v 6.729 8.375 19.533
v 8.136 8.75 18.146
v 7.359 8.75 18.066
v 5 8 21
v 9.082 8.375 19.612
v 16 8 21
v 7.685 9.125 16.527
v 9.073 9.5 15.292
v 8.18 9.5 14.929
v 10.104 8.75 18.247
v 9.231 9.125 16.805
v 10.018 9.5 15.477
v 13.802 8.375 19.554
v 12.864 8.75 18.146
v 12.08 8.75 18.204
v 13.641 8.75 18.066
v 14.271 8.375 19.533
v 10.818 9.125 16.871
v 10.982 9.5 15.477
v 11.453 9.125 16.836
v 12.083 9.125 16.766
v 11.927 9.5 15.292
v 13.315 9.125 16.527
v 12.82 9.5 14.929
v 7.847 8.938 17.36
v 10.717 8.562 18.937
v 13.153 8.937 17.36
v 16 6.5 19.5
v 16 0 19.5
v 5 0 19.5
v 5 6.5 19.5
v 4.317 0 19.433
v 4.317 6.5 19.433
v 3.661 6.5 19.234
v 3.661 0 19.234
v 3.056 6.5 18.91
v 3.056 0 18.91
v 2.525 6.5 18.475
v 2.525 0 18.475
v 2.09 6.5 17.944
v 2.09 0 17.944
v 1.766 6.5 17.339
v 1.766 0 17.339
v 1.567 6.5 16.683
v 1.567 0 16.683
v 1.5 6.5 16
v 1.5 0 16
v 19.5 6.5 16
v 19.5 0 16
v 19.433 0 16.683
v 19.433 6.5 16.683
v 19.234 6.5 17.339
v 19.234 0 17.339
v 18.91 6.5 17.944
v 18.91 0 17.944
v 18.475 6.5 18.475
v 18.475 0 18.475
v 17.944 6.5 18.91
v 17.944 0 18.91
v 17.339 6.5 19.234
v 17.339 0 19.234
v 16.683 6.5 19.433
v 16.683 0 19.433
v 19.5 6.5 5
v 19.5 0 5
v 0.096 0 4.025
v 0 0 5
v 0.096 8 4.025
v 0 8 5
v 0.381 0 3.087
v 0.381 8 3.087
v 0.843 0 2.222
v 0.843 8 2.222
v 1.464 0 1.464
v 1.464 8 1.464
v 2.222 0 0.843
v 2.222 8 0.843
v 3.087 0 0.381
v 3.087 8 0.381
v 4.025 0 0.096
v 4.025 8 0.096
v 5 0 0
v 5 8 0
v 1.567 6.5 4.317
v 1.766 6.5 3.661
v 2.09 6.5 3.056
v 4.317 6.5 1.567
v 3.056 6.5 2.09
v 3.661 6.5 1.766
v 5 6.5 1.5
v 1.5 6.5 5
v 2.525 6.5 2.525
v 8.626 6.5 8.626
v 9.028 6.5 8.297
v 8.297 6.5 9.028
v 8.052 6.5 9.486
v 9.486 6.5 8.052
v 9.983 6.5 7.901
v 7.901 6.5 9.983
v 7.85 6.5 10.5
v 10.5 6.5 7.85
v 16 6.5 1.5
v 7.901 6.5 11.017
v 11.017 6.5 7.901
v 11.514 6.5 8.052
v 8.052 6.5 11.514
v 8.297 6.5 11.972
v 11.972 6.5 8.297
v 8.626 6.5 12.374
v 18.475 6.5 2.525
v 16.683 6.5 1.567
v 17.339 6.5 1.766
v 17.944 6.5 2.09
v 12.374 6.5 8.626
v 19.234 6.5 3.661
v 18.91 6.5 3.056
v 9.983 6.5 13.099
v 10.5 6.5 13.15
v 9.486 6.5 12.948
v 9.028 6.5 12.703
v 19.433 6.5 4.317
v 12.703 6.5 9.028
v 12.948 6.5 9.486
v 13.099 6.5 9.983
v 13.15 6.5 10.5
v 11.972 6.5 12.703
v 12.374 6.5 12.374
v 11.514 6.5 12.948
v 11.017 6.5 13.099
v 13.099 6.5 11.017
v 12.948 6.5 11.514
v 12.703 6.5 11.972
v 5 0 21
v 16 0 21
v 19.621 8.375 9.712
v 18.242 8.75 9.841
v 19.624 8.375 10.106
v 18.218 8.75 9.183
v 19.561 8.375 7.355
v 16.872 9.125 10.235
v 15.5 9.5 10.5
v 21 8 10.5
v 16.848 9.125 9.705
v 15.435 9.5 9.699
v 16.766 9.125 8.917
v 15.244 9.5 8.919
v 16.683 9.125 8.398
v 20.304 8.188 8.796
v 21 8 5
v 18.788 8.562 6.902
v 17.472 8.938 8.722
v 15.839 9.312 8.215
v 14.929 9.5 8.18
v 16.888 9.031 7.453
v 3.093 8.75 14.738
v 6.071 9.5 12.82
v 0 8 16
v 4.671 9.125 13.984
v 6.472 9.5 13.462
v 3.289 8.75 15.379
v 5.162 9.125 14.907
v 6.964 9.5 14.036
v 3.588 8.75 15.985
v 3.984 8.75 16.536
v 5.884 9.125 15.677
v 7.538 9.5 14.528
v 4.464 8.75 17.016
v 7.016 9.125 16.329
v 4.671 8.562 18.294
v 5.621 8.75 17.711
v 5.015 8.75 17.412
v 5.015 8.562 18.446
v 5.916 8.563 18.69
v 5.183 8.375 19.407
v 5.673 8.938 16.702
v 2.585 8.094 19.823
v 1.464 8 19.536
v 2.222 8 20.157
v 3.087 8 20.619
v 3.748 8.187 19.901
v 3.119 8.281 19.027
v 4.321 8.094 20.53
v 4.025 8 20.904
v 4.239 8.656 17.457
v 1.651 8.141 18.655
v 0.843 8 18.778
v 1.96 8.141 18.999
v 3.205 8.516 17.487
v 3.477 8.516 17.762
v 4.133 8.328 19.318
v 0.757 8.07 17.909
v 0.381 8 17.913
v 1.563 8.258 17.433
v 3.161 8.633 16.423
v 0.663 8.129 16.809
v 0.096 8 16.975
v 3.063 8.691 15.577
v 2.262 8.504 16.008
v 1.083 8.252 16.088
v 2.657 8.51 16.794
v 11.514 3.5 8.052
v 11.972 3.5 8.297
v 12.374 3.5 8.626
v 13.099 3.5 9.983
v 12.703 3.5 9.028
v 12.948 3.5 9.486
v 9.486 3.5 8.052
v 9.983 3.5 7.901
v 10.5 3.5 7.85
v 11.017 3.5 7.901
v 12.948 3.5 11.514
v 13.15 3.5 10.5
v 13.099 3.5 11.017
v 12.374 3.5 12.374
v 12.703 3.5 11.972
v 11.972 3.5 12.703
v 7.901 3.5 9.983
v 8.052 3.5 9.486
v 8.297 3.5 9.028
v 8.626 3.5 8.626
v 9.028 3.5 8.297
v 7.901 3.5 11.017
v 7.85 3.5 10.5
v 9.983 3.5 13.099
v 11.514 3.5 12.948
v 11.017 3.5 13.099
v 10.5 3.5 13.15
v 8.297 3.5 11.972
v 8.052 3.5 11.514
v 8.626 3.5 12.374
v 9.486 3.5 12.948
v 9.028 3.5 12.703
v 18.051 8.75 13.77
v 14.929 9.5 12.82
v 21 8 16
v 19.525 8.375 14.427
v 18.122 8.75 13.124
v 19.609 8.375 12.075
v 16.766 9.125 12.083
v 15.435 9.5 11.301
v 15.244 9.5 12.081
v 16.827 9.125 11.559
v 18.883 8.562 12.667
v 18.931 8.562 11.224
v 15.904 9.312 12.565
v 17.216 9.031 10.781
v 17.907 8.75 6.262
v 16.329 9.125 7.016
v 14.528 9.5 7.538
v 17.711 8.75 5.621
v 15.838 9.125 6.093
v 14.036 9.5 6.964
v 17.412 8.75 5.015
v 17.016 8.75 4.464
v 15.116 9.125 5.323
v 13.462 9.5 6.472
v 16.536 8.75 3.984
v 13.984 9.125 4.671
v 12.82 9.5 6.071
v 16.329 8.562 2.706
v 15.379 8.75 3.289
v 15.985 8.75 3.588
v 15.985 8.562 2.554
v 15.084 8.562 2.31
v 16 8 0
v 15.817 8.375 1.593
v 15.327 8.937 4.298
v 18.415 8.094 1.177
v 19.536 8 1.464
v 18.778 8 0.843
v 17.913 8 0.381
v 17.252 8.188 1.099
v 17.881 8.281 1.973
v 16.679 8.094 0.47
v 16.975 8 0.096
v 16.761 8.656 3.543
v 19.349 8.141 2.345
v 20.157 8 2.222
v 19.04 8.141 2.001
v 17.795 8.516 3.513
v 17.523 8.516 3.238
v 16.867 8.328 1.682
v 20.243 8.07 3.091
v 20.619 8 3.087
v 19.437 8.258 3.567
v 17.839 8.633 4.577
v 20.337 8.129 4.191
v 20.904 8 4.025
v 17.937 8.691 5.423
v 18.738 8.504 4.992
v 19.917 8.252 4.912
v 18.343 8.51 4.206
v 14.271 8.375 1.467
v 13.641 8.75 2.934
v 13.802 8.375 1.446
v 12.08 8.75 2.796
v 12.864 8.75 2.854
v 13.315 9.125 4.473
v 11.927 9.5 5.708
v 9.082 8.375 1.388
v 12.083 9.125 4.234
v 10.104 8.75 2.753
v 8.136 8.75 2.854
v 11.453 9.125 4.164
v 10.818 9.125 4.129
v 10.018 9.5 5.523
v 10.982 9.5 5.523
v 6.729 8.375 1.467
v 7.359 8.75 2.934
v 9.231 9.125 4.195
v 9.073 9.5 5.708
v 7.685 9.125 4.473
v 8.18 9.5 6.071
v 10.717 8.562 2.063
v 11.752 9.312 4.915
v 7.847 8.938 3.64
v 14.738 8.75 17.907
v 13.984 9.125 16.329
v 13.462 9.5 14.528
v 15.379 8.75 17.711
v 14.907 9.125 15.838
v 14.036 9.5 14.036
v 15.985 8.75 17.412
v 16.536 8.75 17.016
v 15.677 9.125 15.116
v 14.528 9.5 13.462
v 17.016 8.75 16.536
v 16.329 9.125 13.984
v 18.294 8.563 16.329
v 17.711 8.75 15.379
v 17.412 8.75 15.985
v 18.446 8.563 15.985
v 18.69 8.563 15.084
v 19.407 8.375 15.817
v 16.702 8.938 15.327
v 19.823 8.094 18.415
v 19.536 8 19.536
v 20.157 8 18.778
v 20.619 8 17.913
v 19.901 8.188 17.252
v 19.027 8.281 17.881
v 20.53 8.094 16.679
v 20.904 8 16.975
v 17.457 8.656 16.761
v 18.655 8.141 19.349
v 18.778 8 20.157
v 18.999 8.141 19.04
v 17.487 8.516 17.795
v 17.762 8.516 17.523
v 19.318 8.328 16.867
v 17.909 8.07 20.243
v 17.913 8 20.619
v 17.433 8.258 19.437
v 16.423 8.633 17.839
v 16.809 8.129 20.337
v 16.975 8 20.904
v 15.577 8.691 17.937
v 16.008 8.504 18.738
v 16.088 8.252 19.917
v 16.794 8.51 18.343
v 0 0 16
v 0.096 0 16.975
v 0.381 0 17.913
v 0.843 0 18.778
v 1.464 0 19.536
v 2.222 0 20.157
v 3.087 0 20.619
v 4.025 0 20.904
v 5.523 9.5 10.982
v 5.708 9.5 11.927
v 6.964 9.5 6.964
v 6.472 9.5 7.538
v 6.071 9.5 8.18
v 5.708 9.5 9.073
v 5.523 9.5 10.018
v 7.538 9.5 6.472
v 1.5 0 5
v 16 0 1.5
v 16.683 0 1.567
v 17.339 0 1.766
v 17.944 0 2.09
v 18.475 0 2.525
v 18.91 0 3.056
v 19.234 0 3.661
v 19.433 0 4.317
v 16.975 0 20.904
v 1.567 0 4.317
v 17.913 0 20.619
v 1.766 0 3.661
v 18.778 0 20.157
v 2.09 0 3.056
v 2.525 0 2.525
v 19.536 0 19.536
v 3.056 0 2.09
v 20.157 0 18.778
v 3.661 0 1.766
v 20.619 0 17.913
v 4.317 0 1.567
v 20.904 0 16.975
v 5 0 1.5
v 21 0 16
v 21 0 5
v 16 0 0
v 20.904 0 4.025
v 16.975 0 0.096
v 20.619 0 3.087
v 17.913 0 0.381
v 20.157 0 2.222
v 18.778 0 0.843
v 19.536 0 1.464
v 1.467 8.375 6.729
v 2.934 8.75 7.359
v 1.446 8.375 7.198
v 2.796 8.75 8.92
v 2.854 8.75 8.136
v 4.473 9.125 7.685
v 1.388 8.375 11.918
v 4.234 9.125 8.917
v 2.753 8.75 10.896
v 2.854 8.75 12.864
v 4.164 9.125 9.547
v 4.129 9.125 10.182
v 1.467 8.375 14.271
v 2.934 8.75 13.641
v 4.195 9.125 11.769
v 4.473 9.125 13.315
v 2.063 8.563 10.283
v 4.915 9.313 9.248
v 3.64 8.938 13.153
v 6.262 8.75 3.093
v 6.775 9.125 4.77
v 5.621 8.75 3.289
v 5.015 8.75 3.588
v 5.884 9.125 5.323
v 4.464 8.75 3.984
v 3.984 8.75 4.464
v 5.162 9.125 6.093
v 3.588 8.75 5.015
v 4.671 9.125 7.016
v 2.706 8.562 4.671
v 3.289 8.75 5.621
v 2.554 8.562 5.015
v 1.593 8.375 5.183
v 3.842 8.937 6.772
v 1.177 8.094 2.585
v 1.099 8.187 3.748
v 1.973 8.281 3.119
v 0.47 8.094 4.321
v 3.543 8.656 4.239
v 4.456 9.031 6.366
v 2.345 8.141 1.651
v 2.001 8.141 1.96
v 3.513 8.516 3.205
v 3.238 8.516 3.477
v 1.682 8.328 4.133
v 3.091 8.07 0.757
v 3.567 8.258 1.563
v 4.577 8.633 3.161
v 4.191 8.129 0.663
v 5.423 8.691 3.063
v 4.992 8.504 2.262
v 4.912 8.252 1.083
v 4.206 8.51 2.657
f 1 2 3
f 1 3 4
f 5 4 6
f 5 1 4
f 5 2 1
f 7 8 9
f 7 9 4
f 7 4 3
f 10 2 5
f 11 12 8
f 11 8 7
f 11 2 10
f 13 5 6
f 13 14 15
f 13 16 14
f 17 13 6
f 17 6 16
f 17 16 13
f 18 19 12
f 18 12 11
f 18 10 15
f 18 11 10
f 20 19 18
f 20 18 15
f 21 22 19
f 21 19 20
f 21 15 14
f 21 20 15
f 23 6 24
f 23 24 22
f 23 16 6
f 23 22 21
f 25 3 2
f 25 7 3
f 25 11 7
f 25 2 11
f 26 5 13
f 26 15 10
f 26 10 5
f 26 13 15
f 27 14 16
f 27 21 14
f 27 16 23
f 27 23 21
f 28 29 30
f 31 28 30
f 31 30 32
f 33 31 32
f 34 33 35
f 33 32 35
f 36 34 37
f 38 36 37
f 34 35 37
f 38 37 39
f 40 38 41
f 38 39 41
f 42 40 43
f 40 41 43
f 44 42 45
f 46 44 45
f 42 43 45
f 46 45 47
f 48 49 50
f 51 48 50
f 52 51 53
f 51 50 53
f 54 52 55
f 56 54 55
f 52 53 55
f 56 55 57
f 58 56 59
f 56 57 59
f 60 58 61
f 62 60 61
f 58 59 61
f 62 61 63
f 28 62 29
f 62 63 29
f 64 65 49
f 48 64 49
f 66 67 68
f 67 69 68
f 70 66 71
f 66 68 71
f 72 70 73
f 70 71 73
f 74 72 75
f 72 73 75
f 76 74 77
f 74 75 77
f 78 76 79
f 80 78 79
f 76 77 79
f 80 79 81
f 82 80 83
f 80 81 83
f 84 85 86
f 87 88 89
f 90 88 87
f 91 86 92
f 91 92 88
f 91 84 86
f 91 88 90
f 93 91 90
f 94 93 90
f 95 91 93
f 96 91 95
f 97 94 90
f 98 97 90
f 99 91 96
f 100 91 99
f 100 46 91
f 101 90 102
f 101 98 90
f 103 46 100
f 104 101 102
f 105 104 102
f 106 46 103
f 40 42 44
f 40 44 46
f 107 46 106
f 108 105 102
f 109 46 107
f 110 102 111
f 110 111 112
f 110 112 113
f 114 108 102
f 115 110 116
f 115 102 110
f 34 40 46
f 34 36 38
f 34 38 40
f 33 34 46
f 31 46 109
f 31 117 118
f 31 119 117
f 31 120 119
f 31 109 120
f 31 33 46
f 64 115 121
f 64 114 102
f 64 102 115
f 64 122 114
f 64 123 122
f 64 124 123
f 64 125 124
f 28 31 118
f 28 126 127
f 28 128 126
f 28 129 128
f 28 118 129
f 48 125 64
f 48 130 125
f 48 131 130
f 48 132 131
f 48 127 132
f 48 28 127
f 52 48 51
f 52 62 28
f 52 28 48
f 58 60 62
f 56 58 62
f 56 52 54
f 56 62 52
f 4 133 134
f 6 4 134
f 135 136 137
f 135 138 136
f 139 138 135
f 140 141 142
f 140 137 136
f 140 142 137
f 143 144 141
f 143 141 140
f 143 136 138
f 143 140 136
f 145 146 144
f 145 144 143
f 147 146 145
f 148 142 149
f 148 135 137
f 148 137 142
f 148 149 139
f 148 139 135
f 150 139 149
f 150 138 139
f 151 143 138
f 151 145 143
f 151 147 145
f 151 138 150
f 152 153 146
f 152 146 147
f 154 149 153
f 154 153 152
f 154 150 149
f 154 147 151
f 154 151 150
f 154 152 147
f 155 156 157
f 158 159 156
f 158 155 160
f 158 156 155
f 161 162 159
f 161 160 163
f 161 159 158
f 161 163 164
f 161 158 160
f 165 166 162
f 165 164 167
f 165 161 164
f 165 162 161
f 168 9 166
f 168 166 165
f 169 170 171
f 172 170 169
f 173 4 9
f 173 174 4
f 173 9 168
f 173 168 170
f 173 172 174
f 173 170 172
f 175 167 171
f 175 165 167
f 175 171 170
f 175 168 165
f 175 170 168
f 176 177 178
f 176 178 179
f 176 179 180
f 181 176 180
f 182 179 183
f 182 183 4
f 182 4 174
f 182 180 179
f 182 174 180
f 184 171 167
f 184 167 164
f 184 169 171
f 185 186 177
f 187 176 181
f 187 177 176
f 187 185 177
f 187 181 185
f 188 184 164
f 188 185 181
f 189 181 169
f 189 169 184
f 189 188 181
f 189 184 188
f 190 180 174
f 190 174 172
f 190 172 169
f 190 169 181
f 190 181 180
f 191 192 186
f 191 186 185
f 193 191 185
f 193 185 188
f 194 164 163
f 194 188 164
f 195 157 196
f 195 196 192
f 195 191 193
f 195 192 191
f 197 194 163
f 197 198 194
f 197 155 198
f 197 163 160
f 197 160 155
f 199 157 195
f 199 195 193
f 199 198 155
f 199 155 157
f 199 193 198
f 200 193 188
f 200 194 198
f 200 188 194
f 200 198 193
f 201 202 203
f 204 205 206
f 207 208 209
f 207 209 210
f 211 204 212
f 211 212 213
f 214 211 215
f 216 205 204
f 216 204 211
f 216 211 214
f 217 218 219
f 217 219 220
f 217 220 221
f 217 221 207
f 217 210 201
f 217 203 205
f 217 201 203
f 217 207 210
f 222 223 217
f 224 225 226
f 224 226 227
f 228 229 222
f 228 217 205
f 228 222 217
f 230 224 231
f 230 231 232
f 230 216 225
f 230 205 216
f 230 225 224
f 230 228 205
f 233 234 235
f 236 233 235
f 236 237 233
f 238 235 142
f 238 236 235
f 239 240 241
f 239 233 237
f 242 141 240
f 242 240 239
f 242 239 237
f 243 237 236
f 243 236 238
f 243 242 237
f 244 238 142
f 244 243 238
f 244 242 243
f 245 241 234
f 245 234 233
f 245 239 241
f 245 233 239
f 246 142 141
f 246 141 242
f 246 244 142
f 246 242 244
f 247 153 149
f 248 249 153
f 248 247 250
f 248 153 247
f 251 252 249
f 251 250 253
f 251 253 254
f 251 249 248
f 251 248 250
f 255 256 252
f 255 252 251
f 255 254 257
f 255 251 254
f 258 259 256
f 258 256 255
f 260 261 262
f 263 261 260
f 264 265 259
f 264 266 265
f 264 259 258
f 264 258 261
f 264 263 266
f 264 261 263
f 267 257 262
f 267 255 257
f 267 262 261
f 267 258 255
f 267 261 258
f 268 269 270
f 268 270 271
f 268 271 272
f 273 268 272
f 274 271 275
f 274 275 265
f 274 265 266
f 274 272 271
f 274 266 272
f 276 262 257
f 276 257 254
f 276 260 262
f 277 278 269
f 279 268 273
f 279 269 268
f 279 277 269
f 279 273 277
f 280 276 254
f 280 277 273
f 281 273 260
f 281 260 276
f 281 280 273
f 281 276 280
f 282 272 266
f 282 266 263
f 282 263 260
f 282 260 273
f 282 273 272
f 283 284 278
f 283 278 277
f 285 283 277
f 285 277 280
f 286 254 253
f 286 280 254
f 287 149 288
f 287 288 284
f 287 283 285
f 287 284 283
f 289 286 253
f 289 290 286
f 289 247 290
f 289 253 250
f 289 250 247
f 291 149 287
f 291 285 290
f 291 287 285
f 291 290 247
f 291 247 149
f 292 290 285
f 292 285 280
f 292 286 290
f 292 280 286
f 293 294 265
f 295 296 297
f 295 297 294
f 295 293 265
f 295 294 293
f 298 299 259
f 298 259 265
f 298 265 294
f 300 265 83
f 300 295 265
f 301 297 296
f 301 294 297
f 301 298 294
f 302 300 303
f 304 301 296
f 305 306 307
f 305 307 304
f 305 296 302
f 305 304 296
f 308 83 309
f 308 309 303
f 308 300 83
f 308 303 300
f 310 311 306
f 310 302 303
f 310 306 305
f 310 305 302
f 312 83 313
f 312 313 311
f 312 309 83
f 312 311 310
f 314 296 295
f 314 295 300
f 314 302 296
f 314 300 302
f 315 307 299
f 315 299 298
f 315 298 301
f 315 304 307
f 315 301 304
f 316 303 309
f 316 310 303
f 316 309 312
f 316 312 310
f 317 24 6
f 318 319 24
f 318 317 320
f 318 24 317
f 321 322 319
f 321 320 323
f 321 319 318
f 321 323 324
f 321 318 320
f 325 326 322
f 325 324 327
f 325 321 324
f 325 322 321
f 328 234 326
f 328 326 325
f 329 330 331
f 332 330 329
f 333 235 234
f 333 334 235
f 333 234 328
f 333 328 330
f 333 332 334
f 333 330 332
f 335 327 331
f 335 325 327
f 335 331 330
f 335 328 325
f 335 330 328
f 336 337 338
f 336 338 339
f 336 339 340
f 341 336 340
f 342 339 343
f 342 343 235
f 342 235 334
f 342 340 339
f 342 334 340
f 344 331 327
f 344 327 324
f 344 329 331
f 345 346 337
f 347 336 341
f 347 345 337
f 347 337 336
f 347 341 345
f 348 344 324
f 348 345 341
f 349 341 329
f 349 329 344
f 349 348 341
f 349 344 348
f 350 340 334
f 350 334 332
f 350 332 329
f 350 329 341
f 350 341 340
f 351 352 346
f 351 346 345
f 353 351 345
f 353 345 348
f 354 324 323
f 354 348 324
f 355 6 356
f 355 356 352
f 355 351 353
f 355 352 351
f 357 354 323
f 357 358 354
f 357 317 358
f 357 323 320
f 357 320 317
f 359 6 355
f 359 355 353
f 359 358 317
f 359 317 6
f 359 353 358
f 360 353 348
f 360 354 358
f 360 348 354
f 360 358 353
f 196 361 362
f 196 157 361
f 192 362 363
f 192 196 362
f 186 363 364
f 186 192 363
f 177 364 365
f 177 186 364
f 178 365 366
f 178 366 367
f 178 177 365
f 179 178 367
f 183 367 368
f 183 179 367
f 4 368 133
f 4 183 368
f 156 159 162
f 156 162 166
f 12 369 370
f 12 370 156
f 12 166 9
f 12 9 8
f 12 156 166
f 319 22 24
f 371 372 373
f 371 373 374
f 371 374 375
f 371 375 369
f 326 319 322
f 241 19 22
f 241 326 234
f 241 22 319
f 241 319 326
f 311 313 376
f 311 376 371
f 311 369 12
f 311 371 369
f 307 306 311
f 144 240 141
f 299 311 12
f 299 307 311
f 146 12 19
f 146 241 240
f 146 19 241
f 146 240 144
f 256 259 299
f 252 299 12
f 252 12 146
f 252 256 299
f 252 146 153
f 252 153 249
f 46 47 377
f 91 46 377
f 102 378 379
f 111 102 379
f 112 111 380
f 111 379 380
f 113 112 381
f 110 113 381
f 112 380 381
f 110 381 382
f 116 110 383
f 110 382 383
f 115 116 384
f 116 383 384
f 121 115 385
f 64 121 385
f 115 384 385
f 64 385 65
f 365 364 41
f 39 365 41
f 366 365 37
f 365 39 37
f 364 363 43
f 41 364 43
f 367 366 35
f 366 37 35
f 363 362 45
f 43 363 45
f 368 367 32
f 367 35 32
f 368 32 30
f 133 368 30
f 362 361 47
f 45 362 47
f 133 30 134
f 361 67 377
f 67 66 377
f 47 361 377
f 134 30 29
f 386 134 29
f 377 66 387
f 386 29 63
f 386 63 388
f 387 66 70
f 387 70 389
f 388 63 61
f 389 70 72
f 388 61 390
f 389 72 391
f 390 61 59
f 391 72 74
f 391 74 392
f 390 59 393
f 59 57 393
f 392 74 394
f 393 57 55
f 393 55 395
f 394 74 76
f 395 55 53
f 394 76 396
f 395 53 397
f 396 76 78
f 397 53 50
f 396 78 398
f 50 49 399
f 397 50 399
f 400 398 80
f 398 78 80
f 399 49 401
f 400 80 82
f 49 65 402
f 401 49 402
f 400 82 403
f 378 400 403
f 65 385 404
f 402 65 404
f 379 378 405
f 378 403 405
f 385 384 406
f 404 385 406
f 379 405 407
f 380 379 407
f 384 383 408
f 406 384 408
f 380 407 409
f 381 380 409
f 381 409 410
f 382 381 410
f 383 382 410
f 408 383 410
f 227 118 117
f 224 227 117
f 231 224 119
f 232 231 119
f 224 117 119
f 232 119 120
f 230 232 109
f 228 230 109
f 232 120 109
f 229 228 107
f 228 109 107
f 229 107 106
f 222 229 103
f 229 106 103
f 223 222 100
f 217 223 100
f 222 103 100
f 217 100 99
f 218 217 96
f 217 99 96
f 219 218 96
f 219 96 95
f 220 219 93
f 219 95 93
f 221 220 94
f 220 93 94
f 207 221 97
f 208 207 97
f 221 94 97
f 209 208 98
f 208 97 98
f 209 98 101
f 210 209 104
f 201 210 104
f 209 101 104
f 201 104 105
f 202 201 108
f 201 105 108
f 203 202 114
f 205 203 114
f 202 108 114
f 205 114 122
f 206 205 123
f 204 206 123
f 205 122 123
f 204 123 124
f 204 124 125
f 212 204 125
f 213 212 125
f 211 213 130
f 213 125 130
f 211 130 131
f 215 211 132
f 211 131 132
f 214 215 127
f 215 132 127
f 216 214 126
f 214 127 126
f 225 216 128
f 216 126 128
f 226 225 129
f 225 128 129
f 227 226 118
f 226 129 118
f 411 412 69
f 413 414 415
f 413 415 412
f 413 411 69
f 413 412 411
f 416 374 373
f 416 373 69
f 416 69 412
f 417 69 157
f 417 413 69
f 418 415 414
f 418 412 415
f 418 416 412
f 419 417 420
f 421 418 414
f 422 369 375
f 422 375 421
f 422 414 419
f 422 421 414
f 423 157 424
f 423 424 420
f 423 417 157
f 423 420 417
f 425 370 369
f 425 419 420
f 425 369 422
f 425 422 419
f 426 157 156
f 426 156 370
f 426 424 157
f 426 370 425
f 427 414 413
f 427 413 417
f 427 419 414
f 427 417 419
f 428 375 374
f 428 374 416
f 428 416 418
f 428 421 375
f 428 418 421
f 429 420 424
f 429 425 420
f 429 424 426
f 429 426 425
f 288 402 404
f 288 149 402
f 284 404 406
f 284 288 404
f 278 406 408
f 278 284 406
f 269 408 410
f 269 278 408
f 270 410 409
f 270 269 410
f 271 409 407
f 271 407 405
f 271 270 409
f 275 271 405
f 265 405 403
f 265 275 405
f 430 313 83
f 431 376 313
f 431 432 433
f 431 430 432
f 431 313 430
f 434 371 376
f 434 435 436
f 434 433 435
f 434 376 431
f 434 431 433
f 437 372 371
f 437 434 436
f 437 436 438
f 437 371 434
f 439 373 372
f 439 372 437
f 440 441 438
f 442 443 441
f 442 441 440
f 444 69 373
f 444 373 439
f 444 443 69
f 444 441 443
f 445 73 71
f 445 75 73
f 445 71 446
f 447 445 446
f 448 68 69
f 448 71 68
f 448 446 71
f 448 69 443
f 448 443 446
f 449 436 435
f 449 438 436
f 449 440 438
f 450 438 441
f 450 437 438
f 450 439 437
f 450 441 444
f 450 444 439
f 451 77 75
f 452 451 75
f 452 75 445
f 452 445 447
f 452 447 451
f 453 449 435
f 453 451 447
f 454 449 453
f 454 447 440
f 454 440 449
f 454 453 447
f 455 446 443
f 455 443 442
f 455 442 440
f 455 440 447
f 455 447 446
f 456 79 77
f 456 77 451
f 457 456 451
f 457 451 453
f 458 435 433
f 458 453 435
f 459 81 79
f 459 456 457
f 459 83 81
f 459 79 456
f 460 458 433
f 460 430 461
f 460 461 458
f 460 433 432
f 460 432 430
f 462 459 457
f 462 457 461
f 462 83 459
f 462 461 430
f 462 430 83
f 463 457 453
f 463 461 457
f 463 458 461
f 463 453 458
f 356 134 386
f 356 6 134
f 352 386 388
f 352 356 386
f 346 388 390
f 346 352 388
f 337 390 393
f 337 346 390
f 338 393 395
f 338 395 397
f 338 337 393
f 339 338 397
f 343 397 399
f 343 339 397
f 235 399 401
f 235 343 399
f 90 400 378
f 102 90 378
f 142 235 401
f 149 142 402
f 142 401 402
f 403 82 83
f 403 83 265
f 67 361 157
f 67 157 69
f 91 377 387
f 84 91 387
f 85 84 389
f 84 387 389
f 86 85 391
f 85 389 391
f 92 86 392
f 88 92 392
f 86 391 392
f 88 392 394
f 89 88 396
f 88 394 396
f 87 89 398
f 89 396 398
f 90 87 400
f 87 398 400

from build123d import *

# Parameters (mm, degrees)
SKETCH1_W           = 21
SKETCH1_H           = 21
BOSS_EXTRUDE1_DEPTH = 8
FILLET1_R           = 5
CUT_EXTRUDE2_DEPTH  = 6.5
SKETCH11_R          = 2.65
BOSS_EXTRUDE4_DEPTH = 3
SKETCH2_R           = 5


with BuildPart() as part:
    # Sketch1 → Boss-Extrude1 (new body)
    with BuildSketch(Plane(origin=(0, 0, 0), x_dir=(1, 0, 0), z_dir=(0, 1, 0))):
        with Locations((10.5, -10.5)):
            Rectangle(SKETCH1_W, SKETCH1_H)
    extrude(amount=BOSS_EXTRUDE1_DEPTH)

    # Fillet1
    fillet1_edges = [part.edges().sort_by_distance(p)[0] for p in [
        (0, 4, 0),
        (21, 4, 0),
        (21, 4, 21),
        (0, 4, 21),
    ]]
    fillet(fillet1_edges, radius=FILLET1_R)

    # Sketch10 → Cut-Extrude2 (cut)
    with BuildSketch(Plane.XZ):
        with BuildLine():
            Line((5, 1.5), (16, 1.5))
            ThreePointArc((16, 1.5), (18.474873734, 2.525126266), (19.5, 5))
            Line((19.5, 5), (19.5, 16))
            ThreePointArc((19.5, 16), (18.474873734, 18.474873734), (16, 19.5))
            Line((16, 19.5), (5, 19.5))
            ThreePointArc((5, 19.5), (2.525126266, 18.474873734), (1.5, 16))
            Line((1.5, 16), (1.5, 5))
            ThreePointArc((1.5, 5), (2.525126266, 2.525126266), (5, 1.5))
        make_face()
    extrude(amount=-CUT_EXTRUDE2_DEPTH, mode=Mode.SUBTRACT)

    # Sketch11 → Boss-Extrude4 (add)
    with BuildSketch(Plane.XZ.offset(-6.5)):
        with Locations(Location((10.5, 10.5, 0), (0, 0, 90))):
            Circle(SKETCH11_R)
    extrude(amount=BOSS_EXTRUDE4_DEPTH)

    # Sketch3 → Loft2 section 0
    with BuildSketch(Plane(origin=(0, 8, 0), x_dir=(1, 0, 0), z_dir=(0, 1, 0))):
        with BuildLine():
            Line((16, 0), (5, 0))
            ThreePointArc((5, 0), (1.464466094, -1.464466094), (0, -5))
            Line((0, -5), (0, -16))
            ThreePointArc((0, -16), (1.464466094, -19.535533906), (5, -21))
            Line((5, -21), (16, -21))
            ThreePointArc((16, -21), (19.535533906, -19.535533906), (21, -16))
            Line((21, -16), (21, -5))
            ThreePointArc((21, -5), (19.535533906, -1.464466094), (16, 0))
        make_face()
    # Sketch2 → Loft2 section 1
    with BuildSketch(Plane(origin=(0, 9.5, 0), x_dir=(1, 0, 0), z_dir=(0, 1, 0))):
        with Locations((10.5, -10.5)):
            Circle(SKETCH2_R)
    loft()


solid = part.part
